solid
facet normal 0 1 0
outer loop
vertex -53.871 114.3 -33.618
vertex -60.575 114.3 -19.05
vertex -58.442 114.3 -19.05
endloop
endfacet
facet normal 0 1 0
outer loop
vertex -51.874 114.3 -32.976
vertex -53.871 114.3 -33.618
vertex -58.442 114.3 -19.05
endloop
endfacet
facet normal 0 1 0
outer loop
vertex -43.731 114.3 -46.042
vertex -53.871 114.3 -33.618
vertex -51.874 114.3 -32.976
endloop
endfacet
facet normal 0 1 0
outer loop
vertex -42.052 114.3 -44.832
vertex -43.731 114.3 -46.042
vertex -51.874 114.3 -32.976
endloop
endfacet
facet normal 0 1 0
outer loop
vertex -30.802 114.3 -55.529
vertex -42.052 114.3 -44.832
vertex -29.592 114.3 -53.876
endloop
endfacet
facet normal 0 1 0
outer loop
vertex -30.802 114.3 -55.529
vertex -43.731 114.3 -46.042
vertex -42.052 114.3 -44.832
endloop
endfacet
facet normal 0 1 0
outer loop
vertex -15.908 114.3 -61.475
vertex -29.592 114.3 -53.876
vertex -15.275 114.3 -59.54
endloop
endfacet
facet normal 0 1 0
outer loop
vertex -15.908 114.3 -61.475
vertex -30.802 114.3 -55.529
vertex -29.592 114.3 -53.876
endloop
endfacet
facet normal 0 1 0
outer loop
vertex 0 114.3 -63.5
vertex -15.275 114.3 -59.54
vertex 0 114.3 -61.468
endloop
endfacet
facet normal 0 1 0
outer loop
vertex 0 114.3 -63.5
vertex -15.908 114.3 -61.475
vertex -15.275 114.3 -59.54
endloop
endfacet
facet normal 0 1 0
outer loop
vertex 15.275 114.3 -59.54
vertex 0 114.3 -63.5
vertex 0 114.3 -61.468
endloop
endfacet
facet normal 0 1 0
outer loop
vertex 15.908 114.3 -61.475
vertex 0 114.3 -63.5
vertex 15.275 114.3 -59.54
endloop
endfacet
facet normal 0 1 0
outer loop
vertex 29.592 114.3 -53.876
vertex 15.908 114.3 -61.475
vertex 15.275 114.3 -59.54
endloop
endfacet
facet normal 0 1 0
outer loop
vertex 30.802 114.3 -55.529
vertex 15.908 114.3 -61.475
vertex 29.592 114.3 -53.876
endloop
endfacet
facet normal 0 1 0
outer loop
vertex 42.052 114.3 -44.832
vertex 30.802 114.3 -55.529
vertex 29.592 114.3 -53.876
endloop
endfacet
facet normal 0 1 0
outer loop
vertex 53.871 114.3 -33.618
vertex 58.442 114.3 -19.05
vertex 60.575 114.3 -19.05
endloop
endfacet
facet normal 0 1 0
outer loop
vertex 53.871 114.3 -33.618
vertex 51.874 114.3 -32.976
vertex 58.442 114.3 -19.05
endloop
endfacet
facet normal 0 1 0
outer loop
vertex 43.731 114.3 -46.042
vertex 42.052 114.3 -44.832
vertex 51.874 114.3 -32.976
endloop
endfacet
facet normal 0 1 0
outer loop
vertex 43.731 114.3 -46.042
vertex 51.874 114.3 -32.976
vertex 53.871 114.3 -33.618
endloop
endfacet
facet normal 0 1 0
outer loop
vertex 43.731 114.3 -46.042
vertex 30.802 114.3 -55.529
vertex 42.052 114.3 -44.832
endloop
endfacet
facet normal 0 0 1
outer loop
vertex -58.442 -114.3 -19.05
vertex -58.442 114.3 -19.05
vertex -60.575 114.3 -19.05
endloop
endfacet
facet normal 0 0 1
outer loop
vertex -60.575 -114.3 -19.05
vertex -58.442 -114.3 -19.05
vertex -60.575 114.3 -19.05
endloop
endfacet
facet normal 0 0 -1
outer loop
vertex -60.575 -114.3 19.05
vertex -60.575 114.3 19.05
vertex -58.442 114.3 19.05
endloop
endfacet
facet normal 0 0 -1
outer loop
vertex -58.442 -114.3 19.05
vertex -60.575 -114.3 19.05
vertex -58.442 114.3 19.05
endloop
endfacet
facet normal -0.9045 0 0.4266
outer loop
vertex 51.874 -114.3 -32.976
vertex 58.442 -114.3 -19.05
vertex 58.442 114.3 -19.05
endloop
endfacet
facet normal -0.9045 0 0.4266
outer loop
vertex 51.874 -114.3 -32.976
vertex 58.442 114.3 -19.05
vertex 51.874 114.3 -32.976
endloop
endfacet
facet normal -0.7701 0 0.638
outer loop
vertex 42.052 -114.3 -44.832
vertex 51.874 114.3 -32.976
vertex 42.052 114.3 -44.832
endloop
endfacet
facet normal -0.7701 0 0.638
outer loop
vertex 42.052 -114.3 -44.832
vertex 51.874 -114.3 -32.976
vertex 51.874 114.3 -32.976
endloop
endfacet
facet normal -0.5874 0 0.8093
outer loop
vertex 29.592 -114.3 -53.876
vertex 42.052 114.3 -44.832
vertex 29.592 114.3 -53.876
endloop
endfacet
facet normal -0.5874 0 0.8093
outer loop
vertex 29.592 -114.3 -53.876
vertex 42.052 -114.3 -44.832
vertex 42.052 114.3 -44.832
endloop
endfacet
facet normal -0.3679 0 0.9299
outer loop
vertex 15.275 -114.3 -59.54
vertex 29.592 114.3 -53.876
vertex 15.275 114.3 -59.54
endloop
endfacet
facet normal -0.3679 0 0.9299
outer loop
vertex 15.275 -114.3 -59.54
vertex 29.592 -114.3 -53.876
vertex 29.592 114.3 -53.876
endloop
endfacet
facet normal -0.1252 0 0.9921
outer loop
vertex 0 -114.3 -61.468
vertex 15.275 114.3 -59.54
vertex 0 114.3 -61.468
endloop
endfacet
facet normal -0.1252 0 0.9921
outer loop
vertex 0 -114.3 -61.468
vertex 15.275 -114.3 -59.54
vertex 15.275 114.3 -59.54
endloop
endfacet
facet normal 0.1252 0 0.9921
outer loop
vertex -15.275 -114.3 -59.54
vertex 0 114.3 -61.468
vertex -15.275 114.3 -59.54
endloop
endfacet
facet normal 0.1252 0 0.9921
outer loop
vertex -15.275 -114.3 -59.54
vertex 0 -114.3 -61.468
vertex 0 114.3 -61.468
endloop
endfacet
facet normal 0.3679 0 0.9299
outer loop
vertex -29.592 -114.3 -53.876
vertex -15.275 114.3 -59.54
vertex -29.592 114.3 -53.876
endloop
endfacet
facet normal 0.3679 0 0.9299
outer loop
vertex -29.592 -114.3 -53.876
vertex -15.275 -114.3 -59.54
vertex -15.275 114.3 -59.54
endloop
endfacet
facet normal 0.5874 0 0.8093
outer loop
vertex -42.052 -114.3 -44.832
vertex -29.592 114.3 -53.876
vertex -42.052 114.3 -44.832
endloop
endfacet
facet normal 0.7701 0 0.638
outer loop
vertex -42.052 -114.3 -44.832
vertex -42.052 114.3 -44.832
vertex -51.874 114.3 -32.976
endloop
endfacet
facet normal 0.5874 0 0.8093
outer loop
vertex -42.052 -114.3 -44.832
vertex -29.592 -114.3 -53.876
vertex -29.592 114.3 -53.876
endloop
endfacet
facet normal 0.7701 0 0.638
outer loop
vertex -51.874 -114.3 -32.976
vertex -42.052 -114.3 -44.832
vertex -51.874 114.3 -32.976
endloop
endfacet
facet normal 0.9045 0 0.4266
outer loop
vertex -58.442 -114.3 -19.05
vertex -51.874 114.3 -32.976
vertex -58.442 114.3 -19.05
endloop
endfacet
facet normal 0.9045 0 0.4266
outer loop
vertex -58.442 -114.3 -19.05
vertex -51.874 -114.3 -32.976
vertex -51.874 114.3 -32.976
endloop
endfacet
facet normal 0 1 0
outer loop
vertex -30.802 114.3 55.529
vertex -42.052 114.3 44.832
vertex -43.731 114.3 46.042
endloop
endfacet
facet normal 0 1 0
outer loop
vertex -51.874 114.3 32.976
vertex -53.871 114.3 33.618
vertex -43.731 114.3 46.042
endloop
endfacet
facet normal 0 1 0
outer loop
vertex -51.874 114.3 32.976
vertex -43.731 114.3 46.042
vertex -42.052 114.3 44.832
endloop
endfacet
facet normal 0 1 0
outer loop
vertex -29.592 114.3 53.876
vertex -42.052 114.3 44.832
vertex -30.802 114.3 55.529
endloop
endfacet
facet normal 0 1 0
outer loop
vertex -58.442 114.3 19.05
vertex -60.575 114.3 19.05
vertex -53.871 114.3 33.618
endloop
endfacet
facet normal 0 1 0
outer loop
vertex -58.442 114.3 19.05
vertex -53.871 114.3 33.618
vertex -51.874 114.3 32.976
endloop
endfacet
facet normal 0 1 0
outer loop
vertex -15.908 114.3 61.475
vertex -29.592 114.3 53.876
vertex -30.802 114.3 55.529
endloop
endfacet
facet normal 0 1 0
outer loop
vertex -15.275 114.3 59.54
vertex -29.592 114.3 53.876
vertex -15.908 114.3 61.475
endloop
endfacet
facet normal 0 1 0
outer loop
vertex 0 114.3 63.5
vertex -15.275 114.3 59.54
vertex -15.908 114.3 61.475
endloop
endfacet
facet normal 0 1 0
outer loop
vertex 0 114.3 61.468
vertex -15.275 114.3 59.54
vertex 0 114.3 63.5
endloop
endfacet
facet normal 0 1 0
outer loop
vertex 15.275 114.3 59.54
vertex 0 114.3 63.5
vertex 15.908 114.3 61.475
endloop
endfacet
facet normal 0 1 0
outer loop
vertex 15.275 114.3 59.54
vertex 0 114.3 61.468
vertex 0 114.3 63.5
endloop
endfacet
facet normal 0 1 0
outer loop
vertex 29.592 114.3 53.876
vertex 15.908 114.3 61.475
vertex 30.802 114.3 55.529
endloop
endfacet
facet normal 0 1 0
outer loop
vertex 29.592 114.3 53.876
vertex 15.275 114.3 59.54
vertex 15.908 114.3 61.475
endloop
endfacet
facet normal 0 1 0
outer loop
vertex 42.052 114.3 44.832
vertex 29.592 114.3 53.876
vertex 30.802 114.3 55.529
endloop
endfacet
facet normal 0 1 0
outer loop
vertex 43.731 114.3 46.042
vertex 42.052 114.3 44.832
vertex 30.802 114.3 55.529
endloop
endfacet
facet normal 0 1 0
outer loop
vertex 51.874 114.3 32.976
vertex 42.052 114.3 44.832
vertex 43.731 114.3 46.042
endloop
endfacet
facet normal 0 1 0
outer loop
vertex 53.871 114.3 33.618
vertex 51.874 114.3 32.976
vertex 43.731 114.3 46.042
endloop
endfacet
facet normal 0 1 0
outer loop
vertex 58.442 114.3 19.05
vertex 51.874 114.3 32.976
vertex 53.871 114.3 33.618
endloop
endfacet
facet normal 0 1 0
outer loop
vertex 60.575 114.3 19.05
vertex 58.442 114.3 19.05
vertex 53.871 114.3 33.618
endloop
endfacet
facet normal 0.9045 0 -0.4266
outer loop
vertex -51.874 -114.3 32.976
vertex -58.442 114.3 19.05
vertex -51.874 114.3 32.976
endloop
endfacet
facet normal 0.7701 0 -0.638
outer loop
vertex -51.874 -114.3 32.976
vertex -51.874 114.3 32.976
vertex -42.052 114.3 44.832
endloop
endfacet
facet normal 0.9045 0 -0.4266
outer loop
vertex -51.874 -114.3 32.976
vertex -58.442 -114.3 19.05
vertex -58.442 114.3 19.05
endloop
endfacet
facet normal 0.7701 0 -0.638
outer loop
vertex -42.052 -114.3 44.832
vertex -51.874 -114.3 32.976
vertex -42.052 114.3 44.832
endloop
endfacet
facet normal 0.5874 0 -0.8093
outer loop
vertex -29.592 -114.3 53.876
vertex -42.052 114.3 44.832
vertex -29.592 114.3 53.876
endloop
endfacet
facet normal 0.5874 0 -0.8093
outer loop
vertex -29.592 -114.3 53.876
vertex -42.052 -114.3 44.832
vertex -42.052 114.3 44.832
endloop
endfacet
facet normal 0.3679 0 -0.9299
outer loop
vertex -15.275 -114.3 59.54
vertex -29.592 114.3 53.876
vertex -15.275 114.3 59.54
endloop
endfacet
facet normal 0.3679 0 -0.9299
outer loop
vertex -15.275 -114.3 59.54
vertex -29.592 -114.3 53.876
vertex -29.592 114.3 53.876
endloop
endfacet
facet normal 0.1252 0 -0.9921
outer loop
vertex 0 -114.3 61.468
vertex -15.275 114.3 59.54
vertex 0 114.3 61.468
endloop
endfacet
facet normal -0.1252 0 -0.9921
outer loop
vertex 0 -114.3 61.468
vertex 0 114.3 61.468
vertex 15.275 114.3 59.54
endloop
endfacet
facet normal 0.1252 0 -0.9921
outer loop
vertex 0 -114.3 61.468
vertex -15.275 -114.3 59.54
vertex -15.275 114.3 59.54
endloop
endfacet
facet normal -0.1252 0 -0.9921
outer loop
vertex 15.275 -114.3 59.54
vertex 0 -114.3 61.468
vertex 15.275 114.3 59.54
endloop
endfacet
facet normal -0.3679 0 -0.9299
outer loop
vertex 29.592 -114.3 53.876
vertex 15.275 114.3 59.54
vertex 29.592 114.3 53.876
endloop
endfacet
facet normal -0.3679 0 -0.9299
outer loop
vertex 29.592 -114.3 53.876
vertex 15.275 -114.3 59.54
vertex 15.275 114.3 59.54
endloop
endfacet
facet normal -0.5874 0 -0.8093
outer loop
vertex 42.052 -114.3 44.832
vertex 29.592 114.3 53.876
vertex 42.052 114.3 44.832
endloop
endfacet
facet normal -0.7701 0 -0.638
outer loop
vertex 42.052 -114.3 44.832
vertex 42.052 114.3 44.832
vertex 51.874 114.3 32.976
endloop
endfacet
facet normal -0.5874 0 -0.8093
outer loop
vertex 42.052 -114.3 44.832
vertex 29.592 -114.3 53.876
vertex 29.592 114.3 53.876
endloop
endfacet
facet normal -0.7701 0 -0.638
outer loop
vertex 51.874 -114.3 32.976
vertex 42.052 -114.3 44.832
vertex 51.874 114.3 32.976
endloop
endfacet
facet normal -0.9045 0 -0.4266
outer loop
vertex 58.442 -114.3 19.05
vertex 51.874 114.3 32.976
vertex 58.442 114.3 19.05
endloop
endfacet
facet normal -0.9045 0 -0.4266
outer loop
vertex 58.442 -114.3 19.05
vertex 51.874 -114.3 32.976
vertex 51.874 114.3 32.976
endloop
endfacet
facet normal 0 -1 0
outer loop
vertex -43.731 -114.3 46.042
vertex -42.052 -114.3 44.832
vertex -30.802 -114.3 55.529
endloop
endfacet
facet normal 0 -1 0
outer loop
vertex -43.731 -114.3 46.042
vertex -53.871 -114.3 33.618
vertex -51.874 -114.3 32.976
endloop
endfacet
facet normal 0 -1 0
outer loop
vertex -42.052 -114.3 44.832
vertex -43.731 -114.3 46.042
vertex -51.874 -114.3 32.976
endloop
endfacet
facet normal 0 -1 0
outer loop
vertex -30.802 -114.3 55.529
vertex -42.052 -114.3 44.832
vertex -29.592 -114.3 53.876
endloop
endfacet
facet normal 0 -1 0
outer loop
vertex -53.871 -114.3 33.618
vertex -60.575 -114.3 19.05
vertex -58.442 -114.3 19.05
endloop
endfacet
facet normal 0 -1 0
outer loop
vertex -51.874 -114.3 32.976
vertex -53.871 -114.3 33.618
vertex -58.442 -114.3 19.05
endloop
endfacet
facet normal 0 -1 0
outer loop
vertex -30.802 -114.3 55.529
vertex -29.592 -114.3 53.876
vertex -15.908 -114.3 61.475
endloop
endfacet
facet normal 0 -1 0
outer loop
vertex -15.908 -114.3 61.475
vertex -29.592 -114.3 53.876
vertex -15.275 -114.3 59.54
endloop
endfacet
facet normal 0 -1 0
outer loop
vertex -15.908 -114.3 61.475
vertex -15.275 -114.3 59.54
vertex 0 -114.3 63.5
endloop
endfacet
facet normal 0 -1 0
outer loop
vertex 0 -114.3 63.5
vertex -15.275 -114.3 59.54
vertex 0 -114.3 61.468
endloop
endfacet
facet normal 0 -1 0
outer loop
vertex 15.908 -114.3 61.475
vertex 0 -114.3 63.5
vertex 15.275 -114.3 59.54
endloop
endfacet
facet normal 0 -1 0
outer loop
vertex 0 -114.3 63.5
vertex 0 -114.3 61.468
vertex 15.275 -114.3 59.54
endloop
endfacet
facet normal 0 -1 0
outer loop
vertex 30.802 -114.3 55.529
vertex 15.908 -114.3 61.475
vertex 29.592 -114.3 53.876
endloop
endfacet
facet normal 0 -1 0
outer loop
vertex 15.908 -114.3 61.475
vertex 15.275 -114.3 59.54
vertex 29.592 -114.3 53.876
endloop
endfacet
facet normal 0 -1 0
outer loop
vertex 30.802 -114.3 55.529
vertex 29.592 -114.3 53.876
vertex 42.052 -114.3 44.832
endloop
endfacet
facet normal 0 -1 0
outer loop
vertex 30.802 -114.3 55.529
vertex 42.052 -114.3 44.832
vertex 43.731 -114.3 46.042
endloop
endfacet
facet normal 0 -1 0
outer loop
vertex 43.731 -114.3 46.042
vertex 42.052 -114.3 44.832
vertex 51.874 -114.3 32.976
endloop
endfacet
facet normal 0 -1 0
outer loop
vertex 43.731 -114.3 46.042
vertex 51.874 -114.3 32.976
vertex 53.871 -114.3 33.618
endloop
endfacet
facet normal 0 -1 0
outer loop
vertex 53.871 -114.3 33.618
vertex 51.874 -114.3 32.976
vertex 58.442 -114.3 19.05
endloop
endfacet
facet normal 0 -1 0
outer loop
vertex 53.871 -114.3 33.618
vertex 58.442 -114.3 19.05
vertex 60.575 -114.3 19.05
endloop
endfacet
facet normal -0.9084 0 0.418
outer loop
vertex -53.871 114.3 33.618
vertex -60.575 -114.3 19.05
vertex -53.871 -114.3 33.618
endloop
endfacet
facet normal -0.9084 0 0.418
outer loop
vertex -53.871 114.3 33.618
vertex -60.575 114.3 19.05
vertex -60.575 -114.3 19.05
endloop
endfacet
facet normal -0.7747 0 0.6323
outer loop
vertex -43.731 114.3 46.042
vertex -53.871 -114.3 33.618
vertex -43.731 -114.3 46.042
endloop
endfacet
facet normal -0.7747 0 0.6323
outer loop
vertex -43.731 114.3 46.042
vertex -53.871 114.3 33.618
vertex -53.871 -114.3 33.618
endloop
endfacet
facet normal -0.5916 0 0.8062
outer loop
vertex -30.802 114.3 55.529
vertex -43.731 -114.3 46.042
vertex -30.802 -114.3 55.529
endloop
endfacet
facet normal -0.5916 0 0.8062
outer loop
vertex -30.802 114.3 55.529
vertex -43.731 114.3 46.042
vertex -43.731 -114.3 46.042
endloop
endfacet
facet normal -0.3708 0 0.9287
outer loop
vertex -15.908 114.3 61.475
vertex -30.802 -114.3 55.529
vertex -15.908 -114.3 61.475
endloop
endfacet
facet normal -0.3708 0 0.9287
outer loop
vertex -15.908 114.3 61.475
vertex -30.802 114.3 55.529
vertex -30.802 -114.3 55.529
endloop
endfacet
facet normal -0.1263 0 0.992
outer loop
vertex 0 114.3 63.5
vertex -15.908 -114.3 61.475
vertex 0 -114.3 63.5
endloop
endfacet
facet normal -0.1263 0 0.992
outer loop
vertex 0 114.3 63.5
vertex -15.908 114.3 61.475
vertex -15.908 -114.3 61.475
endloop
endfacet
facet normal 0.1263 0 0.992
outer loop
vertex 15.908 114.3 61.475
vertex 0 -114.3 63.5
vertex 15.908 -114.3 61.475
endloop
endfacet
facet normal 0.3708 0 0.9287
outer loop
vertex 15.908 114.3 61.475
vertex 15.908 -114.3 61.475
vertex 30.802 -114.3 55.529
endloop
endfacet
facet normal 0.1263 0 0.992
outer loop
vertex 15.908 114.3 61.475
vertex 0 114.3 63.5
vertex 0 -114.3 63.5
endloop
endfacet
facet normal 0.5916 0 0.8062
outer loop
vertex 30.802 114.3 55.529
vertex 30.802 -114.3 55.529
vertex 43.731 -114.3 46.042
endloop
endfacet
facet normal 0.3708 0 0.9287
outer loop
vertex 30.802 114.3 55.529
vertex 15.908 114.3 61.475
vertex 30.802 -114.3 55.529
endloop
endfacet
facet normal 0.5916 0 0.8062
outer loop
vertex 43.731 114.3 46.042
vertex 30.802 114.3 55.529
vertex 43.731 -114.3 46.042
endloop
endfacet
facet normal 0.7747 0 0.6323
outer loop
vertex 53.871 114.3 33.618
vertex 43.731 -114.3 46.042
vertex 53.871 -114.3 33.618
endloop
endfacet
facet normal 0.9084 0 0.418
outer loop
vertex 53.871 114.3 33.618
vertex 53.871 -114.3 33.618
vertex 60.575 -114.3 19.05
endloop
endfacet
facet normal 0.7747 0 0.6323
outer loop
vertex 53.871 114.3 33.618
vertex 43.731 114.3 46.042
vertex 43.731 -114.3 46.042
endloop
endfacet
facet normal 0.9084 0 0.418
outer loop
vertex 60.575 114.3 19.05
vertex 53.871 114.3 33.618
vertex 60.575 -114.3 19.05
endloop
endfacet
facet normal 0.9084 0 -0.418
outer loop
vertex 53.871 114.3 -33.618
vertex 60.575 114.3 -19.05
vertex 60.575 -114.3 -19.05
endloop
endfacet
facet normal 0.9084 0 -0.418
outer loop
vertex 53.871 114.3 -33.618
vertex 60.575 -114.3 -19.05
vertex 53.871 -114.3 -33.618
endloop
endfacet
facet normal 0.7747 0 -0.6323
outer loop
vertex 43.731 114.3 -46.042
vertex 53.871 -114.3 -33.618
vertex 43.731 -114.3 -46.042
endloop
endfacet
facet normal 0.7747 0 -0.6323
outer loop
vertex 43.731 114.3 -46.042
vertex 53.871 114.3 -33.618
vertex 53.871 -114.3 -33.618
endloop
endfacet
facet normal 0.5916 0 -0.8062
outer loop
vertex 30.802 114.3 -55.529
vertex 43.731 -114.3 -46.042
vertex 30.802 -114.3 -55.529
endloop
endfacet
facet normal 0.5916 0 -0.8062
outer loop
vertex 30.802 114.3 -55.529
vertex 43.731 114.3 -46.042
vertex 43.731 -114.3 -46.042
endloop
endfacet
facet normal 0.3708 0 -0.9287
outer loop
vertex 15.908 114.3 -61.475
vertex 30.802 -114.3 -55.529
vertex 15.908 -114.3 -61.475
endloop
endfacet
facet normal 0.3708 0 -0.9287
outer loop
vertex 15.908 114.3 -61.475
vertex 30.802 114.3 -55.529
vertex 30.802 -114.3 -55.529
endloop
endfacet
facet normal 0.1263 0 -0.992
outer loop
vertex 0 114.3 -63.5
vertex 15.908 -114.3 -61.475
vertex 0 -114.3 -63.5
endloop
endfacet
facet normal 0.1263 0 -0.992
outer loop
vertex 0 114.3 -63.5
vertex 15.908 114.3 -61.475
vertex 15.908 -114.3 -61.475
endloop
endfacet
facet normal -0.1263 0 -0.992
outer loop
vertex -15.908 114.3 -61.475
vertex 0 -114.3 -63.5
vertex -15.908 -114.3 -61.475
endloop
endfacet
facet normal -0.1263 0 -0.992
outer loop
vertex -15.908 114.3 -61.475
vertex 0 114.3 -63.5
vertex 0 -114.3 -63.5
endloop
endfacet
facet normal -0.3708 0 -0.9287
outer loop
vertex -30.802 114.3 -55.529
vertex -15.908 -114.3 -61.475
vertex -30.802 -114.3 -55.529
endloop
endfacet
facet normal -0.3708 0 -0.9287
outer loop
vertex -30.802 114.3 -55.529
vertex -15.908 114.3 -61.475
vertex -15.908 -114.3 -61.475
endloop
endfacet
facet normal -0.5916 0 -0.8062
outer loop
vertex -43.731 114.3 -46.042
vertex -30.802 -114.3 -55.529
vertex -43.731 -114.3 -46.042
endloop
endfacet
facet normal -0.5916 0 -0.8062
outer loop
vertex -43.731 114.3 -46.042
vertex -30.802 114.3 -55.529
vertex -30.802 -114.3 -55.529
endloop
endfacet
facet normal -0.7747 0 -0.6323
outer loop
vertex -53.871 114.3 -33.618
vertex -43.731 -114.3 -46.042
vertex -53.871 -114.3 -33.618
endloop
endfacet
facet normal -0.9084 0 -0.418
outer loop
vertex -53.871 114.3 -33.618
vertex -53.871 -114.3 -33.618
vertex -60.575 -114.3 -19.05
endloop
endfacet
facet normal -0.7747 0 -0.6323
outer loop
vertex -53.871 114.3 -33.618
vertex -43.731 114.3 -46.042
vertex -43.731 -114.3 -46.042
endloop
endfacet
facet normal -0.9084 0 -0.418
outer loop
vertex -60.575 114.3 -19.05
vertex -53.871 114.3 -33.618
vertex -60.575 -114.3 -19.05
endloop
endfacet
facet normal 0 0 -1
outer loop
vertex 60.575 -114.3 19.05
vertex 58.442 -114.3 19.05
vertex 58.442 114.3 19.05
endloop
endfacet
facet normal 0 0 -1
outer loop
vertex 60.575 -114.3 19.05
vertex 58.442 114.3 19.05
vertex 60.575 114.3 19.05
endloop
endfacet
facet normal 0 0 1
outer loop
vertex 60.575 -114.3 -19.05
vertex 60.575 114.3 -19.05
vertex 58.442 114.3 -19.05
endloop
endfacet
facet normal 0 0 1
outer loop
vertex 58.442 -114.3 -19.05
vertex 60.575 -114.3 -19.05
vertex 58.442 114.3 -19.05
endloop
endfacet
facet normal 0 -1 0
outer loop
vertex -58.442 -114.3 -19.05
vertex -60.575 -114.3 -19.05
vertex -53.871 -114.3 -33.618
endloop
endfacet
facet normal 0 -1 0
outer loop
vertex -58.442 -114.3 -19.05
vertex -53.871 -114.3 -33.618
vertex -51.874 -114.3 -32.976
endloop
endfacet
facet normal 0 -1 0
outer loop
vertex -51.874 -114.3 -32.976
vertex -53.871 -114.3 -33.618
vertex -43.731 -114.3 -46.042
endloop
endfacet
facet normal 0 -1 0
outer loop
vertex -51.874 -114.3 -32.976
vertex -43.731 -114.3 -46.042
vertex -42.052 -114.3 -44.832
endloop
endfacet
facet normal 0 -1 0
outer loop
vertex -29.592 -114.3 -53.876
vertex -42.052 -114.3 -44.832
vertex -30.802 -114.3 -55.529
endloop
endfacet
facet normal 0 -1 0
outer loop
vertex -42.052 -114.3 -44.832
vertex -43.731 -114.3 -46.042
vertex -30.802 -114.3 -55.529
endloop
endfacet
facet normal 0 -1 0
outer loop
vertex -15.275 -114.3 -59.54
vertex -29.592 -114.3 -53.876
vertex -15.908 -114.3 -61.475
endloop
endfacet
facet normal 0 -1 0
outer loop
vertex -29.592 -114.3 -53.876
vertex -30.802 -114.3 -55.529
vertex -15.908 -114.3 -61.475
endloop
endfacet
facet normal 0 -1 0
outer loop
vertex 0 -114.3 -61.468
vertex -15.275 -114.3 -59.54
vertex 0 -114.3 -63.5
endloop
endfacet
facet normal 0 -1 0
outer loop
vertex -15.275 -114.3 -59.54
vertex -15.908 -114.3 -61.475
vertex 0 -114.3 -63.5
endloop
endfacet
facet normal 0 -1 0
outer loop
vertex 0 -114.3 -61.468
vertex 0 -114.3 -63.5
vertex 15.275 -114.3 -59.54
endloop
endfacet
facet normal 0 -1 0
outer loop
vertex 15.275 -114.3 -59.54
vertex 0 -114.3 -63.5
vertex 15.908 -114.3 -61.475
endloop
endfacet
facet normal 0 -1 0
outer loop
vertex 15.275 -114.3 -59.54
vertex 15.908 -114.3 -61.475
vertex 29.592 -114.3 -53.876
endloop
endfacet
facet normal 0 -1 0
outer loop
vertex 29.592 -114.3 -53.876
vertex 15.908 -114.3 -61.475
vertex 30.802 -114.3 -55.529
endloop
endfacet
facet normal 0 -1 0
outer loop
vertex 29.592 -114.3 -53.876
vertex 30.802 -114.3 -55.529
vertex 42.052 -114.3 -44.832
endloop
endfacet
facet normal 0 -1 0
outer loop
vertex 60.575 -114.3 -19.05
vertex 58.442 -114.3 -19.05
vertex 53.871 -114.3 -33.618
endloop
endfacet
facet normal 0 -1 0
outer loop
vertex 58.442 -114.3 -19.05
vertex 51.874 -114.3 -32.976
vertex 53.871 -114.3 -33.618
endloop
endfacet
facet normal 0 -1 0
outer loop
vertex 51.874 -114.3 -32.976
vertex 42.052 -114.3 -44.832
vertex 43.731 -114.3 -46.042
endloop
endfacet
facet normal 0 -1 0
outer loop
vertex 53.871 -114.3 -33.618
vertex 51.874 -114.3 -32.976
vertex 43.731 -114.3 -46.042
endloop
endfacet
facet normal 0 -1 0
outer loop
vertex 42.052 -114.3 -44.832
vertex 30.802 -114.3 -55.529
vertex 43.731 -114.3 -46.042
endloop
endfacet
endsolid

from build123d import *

# Parameters (mm, degrees)
SKETCH4_R               = 63.5
SKETCH4_R_2             = 61.468
BOSS_EXTRUDE1_DEPTH     = 114.3
CUT_EXTRUDE2_DEPTH      = 115.3
CUT_EXTRUDE2_DEPTH_BACK = 115.3


with BuildPart() as part:
    # Sketch4 → Boss-Extrude1 (new body, symmetric)
    with BuildSketch(Plane(origin=(0, 0, 0), x_dir=(1, 0, 0), z_dir=(0, 1, 0))):
        Circle(SKETCH4_R)
        Circle(SKETCH4_R_2, mode=Mode.SUBTRACT)
    extrude(amount=BOSS_EXTRUDE1_DEPTH, both=True)

    # Sketch5 → Cut-Extrude2 (cut, two sides)
    with BuildSketch(Plane(origin=(0, 0, 0), x_dir=(1, 0, 0), z_dir=(0, 1, 0))) as cut_extrude2_sk:
        Polygon((76.2, 19.05), (-76.2, 19.05), (-76.2, 18.415), (-76.2, -18.415), (-76.2, -19.05), (76.2, -19.05), (76.2, -18.415), (76.2, 18.415), align=None)
    extrude(amount=CUT_EXTRUDE2_DEPTH, mode=Mode.SUBTRACT)
    extrude(cut_extrude2_sk.sketch, amount=-CUT_EXTRUDE2_DEPTH_BACK, mode=Mode.SUBTRACT)


solid = part.part
